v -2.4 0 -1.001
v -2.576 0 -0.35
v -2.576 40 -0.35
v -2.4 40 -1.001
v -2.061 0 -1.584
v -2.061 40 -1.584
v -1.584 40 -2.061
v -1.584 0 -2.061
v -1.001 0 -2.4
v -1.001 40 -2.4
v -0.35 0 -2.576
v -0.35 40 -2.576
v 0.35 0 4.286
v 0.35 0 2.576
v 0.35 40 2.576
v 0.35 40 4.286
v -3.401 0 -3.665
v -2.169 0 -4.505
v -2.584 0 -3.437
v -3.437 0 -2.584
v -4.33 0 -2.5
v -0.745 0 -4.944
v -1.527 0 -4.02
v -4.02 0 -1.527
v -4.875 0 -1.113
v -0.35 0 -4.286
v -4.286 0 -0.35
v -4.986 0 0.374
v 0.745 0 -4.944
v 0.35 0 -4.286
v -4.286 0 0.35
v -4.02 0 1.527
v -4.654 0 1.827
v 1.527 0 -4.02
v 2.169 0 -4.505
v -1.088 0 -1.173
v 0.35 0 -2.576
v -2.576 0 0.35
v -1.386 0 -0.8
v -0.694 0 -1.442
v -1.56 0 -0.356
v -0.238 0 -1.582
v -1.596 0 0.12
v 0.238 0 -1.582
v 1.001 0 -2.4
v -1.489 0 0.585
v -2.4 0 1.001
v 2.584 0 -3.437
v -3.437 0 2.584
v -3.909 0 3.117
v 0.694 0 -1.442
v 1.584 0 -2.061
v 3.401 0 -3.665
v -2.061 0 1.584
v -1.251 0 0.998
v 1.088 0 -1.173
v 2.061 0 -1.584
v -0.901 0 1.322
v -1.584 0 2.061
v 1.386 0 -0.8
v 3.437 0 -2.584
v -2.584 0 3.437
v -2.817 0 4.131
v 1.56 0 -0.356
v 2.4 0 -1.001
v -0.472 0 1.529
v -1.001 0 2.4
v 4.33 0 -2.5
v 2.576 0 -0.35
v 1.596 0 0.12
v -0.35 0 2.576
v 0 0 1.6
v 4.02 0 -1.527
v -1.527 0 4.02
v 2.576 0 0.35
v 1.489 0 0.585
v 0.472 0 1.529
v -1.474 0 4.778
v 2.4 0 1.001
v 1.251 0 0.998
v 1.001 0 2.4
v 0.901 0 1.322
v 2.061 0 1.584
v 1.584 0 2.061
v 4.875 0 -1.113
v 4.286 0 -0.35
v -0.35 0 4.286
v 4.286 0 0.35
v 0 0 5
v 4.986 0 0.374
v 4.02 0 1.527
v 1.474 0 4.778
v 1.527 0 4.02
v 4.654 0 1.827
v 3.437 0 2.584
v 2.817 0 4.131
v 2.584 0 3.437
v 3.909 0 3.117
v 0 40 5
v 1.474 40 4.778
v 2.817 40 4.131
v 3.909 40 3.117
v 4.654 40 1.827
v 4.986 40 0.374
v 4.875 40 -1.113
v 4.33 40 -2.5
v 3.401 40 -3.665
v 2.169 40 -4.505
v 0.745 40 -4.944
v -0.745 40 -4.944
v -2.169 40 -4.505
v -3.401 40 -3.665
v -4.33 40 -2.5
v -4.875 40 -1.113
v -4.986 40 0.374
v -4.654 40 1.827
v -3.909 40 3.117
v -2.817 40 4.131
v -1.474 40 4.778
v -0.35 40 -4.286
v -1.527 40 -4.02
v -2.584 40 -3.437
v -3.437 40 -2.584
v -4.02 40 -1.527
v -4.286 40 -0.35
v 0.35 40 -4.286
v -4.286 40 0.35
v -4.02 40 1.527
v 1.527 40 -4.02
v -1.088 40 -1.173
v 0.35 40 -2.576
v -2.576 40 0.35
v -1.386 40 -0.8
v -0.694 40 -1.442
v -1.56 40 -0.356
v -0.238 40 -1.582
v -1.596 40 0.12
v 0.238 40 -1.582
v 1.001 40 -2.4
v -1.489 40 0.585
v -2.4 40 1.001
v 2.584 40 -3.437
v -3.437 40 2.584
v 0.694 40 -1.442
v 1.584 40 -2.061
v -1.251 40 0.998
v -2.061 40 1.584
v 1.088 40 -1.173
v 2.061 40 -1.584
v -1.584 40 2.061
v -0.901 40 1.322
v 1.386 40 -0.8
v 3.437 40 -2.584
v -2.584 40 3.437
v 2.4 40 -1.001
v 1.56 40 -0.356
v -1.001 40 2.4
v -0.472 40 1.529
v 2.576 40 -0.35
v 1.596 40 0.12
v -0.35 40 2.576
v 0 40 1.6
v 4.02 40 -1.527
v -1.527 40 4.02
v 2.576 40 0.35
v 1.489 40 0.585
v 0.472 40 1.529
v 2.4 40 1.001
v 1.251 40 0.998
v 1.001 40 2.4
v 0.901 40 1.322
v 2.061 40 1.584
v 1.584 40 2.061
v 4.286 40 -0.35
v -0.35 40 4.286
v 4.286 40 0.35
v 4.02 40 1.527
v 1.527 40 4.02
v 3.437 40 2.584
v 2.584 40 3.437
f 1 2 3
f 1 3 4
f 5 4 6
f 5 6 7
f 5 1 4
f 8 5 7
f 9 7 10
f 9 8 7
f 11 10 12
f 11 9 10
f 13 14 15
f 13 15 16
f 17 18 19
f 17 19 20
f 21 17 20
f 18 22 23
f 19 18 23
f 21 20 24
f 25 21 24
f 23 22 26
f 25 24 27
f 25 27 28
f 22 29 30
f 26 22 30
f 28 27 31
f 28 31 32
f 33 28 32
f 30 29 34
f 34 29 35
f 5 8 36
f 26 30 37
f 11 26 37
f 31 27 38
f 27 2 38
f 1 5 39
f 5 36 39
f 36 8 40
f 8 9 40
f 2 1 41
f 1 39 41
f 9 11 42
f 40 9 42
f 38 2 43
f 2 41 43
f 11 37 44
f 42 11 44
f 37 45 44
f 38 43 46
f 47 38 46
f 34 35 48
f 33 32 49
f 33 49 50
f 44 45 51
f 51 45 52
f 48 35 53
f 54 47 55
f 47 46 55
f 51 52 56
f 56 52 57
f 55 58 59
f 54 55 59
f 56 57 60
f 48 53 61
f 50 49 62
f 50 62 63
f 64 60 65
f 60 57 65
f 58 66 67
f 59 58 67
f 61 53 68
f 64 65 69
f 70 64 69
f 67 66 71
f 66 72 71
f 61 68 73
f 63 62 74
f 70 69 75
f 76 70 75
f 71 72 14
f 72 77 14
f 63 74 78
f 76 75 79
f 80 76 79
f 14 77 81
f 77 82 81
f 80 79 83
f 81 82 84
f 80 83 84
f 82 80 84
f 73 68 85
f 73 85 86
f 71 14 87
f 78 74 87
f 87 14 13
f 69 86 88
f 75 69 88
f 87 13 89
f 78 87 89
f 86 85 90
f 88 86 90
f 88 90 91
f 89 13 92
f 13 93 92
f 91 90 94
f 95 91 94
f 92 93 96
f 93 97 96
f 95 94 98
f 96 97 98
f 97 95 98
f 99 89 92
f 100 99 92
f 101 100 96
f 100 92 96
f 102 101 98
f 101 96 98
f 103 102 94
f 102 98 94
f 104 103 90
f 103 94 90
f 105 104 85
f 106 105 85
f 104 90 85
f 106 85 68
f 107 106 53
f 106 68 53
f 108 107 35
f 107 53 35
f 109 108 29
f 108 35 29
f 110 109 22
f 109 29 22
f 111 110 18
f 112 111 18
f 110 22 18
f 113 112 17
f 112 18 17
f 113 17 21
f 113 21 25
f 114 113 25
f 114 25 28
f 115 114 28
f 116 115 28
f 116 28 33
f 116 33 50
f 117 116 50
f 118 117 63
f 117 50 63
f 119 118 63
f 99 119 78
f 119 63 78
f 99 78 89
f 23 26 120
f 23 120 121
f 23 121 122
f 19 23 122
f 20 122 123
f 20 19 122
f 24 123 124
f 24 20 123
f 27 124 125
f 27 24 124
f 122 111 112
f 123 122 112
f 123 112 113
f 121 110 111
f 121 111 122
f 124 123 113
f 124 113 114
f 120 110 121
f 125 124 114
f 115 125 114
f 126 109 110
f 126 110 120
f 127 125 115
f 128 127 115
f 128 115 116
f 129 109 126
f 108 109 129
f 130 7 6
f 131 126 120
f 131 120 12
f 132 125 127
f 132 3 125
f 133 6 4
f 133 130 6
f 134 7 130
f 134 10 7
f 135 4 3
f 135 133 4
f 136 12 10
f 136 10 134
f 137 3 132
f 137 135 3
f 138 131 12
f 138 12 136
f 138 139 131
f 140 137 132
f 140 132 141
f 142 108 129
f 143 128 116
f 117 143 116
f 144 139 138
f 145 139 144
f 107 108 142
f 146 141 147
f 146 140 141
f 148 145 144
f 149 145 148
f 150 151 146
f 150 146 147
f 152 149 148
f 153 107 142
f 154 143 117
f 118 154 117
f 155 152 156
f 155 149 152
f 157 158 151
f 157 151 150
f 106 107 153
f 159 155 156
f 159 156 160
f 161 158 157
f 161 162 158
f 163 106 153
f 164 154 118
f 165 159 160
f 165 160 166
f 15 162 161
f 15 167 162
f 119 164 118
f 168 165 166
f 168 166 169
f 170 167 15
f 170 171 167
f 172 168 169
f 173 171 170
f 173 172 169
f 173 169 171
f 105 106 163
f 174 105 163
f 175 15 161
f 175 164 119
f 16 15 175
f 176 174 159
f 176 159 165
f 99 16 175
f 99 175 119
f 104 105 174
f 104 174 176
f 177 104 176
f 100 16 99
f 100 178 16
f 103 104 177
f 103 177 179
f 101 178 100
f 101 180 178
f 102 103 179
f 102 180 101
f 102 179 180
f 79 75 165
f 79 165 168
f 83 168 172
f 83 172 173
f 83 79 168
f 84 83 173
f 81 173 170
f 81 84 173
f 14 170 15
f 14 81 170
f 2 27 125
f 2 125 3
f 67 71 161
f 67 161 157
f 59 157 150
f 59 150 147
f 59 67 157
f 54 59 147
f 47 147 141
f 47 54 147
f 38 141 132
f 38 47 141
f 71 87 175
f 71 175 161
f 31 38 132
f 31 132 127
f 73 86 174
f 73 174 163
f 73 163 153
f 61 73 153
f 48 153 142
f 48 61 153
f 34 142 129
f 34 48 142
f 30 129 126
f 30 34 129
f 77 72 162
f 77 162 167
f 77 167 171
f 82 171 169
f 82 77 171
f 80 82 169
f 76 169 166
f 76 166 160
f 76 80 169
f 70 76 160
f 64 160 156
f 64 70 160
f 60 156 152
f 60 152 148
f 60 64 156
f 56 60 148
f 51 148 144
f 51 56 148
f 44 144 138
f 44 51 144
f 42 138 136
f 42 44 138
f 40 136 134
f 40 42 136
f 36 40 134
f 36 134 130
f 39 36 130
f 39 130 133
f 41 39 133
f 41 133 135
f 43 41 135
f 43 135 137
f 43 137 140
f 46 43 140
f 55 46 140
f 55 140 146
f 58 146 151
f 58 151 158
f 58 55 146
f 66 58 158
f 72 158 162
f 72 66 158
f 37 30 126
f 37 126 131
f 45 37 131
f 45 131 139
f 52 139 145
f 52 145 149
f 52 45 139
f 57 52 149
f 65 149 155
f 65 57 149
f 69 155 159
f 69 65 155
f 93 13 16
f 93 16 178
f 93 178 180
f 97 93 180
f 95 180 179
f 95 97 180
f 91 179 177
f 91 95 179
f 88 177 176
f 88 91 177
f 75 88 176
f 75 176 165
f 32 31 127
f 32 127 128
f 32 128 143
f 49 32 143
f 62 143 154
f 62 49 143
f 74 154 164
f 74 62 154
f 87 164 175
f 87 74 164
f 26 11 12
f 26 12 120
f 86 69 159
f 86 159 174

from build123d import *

# Parameters (mm, degrees)
SKETCH_1_R      = 5
SKETCH_1_R_2    = 1.6
EXTRUDE_1_DEPTH = 40


with BuildPart() as part:
    # 草图1 → 凸台-拉伸1 (new body)
    with BuildSketch(Plane(origin=(0, 0, 0), x_dir=(1, 0, 0), z_dir=(0, 1, 0))):
        with Locations(Location((0, 0, 0), (0, 0, 270))):
            Circle(SKETCH_1_R)
        with Locations(Location((0, 0, 0), (0, 0, 270))):
            Circle(SKETCH_1_R_2, mode=Mode.SUBTRACT)
        with BuildLine():
            ThreePointArc((4.285732143, 0.35), (3.040559159, 3.040559159), (0.35, 4.285732143))
            Line((0.35, 4.285732143), (0.35, 2.576334606))
            ThreePointArc((0.35, 2.576334606), (1.838477631, 1.838477631), (2.576334606, 0.35))
            Line((2.576334606, 0.35), (4.285732143, 0.35))
        make_face(mode=Mode.SUBTRACT)
        with BuildLine():
            ThreePointArc((0.35, -4.285732143), (3.040559159, -3.040559159), (4.285732143, -0.35))
            Line((4.285732143, -0.35), (2.576334606, -0.35))
            ThreePointArc((2.576334606, -0.35), (1.838477631, -1.838477631), (0.35, -2.576334606))
            Line((0.35, -2.576334606), (0.35, -4.285732143))
        make_face(mode=Mode.SUBTRACT)
        with BuildLine():
            ThreePointArc((-4.285732143, -0.35), (-3.040559159, -3.040559159), (-0.35, -4.285732143))
            Line((-0.35, -4.285732143), (-0.35, -2.576334606))
            ThreePointArc((-0.35, -2.576334606), (-1.838477631, -1.838477631), (-2.576334606, -0.35))
            Line((-2.576334606, -0.35), (-4.285732143, -0.35))
        make_face(mode=Mode.SUBTRACT)
        with BuildLine():
            ThreePointArc((-0.35, 4.285732143), (-3.040559159, 3.040559159), (-4.285732143, 0.35))
            Line((-4.285732143, 0.35), (-2.576334606, 0.35))
            ThreePointArc((-2.576334606, 0.35), (-1.838477631, 1.838477631), (-0.35, 2.576334606))
            Line((-0.35, 2.576334606), (-0.35, 4.285732143))
        make_face(mode=Mode.SUBTRACT)
    extrude(amount=EXTRUDE_1_DEPTH)


solid = part.part
